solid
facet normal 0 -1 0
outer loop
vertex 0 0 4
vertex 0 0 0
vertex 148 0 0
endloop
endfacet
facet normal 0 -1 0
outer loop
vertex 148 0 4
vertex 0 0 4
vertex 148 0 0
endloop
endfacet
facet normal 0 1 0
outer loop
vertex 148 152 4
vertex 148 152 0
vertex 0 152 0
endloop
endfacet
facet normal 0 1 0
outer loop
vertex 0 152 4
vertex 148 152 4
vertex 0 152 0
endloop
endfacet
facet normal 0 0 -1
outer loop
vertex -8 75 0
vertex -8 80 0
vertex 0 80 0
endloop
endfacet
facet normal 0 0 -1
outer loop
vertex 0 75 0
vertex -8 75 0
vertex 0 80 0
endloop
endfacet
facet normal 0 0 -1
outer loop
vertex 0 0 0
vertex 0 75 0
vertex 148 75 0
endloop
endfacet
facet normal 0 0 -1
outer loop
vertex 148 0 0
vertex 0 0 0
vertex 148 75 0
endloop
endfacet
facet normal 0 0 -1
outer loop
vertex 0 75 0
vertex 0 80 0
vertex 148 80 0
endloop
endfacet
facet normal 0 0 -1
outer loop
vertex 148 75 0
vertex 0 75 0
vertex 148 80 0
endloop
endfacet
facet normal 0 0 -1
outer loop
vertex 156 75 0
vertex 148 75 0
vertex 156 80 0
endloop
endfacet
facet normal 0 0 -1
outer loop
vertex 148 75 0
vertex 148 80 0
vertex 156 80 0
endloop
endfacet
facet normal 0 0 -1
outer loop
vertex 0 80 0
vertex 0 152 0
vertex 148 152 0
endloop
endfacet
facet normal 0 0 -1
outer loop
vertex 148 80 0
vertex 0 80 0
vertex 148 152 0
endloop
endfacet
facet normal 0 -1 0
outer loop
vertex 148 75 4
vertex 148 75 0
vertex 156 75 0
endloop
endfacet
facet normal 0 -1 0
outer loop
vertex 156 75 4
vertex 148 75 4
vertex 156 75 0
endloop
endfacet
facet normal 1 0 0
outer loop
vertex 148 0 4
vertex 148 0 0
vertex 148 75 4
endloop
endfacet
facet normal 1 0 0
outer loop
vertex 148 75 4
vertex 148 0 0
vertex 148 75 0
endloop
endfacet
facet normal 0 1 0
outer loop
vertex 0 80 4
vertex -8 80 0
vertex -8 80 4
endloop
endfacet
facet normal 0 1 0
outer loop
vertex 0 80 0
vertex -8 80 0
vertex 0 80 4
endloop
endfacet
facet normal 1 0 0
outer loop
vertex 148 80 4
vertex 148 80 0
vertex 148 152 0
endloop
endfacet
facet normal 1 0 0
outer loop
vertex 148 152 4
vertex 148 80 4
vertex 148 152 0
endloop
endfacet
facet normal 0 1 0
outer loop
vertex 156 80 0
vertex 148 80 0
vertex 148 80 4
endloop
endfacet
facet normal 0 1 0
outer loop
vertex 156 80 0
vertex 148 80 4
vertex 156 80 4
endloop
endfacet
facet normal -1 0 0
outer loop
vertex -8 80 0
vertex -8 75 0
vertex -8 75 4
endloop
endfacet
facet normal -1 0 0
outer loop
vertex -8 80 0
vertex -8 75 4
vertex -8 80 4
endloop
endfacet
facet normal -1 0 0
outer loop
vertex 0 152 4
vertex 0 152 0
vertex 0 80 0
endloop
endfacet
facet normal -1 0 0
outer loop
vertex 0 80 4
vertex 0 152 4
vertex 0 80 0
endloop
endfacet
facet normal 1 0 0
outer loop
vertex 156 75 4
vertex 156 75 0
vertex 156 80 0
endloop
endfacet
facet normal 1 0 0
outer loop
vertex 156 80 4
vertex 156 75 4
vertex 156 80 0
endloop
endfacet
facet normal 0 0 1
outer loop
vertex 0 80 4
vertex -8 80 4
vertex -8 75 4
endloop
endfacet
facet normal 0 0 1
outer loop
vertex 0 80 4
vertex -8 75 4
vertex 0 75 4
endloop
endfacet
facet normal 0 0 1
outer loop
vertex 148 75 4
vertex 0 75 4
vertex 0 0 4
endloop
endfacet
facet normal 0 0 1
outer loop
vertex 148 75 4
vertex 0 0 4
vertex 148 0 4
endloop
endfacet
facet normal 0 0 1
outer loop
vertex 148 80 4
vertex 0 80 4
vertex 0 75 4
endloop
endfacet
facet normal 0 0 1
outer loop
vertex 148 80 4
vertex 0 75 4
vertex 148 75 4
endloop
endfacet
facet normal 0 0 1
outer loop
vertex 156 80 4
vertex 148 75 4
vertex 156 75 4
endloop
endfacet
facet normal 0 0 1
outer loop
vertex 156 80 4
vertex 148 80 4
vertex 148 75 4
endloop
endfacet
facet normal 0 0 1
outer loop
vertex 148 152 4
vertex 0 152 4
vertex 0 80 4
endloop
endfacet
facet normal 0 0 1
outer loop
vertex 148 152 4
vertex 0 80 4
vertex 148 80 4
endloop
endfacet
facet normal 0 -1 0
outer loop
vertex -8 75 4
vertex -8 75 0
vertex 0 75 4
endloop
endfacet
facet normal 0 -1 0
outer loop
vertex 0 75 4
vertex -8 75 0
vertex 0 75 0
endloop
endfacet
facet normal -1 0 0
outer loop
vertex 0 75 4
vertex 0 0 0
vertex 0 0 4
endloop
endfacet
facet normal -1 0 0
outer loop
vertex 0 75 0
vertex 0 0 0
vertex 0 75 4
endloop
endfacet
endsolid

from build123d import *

# Parameters (mm, degrees)
SKETCH_1_W      = 8
SKETCH_1_H      = 5
SKETCH_1_W_2    = 148
SKETCH_1_H_2    = 75
EXTRUDE_1_DEPTH = 4


with BuildPart() as part:
    # Эскиз1 → Бобышка-Вытянуть1 (new body)
    with BuildSketch(Plane.XY):
        Polygon((0, 80), (0, 75), (148, 75), (148, 80), (148, 152), (0, 152), align=None)
        with Locations((-4, 77.5)):
            Rectangle(SKETCH_1_W, SKETCH_1_H)
        with Locations((74, 37.5)):
            Rectangle(SKETCH_1_W_2, SKETCH_1_H_2)
        with Locations((152, 77.5)):
            Rectangle(SKETCH_1_W, SKETCH_1_H)
    extrude(amount=EXTRUDE_1_DEPTH)


solid = part.part
